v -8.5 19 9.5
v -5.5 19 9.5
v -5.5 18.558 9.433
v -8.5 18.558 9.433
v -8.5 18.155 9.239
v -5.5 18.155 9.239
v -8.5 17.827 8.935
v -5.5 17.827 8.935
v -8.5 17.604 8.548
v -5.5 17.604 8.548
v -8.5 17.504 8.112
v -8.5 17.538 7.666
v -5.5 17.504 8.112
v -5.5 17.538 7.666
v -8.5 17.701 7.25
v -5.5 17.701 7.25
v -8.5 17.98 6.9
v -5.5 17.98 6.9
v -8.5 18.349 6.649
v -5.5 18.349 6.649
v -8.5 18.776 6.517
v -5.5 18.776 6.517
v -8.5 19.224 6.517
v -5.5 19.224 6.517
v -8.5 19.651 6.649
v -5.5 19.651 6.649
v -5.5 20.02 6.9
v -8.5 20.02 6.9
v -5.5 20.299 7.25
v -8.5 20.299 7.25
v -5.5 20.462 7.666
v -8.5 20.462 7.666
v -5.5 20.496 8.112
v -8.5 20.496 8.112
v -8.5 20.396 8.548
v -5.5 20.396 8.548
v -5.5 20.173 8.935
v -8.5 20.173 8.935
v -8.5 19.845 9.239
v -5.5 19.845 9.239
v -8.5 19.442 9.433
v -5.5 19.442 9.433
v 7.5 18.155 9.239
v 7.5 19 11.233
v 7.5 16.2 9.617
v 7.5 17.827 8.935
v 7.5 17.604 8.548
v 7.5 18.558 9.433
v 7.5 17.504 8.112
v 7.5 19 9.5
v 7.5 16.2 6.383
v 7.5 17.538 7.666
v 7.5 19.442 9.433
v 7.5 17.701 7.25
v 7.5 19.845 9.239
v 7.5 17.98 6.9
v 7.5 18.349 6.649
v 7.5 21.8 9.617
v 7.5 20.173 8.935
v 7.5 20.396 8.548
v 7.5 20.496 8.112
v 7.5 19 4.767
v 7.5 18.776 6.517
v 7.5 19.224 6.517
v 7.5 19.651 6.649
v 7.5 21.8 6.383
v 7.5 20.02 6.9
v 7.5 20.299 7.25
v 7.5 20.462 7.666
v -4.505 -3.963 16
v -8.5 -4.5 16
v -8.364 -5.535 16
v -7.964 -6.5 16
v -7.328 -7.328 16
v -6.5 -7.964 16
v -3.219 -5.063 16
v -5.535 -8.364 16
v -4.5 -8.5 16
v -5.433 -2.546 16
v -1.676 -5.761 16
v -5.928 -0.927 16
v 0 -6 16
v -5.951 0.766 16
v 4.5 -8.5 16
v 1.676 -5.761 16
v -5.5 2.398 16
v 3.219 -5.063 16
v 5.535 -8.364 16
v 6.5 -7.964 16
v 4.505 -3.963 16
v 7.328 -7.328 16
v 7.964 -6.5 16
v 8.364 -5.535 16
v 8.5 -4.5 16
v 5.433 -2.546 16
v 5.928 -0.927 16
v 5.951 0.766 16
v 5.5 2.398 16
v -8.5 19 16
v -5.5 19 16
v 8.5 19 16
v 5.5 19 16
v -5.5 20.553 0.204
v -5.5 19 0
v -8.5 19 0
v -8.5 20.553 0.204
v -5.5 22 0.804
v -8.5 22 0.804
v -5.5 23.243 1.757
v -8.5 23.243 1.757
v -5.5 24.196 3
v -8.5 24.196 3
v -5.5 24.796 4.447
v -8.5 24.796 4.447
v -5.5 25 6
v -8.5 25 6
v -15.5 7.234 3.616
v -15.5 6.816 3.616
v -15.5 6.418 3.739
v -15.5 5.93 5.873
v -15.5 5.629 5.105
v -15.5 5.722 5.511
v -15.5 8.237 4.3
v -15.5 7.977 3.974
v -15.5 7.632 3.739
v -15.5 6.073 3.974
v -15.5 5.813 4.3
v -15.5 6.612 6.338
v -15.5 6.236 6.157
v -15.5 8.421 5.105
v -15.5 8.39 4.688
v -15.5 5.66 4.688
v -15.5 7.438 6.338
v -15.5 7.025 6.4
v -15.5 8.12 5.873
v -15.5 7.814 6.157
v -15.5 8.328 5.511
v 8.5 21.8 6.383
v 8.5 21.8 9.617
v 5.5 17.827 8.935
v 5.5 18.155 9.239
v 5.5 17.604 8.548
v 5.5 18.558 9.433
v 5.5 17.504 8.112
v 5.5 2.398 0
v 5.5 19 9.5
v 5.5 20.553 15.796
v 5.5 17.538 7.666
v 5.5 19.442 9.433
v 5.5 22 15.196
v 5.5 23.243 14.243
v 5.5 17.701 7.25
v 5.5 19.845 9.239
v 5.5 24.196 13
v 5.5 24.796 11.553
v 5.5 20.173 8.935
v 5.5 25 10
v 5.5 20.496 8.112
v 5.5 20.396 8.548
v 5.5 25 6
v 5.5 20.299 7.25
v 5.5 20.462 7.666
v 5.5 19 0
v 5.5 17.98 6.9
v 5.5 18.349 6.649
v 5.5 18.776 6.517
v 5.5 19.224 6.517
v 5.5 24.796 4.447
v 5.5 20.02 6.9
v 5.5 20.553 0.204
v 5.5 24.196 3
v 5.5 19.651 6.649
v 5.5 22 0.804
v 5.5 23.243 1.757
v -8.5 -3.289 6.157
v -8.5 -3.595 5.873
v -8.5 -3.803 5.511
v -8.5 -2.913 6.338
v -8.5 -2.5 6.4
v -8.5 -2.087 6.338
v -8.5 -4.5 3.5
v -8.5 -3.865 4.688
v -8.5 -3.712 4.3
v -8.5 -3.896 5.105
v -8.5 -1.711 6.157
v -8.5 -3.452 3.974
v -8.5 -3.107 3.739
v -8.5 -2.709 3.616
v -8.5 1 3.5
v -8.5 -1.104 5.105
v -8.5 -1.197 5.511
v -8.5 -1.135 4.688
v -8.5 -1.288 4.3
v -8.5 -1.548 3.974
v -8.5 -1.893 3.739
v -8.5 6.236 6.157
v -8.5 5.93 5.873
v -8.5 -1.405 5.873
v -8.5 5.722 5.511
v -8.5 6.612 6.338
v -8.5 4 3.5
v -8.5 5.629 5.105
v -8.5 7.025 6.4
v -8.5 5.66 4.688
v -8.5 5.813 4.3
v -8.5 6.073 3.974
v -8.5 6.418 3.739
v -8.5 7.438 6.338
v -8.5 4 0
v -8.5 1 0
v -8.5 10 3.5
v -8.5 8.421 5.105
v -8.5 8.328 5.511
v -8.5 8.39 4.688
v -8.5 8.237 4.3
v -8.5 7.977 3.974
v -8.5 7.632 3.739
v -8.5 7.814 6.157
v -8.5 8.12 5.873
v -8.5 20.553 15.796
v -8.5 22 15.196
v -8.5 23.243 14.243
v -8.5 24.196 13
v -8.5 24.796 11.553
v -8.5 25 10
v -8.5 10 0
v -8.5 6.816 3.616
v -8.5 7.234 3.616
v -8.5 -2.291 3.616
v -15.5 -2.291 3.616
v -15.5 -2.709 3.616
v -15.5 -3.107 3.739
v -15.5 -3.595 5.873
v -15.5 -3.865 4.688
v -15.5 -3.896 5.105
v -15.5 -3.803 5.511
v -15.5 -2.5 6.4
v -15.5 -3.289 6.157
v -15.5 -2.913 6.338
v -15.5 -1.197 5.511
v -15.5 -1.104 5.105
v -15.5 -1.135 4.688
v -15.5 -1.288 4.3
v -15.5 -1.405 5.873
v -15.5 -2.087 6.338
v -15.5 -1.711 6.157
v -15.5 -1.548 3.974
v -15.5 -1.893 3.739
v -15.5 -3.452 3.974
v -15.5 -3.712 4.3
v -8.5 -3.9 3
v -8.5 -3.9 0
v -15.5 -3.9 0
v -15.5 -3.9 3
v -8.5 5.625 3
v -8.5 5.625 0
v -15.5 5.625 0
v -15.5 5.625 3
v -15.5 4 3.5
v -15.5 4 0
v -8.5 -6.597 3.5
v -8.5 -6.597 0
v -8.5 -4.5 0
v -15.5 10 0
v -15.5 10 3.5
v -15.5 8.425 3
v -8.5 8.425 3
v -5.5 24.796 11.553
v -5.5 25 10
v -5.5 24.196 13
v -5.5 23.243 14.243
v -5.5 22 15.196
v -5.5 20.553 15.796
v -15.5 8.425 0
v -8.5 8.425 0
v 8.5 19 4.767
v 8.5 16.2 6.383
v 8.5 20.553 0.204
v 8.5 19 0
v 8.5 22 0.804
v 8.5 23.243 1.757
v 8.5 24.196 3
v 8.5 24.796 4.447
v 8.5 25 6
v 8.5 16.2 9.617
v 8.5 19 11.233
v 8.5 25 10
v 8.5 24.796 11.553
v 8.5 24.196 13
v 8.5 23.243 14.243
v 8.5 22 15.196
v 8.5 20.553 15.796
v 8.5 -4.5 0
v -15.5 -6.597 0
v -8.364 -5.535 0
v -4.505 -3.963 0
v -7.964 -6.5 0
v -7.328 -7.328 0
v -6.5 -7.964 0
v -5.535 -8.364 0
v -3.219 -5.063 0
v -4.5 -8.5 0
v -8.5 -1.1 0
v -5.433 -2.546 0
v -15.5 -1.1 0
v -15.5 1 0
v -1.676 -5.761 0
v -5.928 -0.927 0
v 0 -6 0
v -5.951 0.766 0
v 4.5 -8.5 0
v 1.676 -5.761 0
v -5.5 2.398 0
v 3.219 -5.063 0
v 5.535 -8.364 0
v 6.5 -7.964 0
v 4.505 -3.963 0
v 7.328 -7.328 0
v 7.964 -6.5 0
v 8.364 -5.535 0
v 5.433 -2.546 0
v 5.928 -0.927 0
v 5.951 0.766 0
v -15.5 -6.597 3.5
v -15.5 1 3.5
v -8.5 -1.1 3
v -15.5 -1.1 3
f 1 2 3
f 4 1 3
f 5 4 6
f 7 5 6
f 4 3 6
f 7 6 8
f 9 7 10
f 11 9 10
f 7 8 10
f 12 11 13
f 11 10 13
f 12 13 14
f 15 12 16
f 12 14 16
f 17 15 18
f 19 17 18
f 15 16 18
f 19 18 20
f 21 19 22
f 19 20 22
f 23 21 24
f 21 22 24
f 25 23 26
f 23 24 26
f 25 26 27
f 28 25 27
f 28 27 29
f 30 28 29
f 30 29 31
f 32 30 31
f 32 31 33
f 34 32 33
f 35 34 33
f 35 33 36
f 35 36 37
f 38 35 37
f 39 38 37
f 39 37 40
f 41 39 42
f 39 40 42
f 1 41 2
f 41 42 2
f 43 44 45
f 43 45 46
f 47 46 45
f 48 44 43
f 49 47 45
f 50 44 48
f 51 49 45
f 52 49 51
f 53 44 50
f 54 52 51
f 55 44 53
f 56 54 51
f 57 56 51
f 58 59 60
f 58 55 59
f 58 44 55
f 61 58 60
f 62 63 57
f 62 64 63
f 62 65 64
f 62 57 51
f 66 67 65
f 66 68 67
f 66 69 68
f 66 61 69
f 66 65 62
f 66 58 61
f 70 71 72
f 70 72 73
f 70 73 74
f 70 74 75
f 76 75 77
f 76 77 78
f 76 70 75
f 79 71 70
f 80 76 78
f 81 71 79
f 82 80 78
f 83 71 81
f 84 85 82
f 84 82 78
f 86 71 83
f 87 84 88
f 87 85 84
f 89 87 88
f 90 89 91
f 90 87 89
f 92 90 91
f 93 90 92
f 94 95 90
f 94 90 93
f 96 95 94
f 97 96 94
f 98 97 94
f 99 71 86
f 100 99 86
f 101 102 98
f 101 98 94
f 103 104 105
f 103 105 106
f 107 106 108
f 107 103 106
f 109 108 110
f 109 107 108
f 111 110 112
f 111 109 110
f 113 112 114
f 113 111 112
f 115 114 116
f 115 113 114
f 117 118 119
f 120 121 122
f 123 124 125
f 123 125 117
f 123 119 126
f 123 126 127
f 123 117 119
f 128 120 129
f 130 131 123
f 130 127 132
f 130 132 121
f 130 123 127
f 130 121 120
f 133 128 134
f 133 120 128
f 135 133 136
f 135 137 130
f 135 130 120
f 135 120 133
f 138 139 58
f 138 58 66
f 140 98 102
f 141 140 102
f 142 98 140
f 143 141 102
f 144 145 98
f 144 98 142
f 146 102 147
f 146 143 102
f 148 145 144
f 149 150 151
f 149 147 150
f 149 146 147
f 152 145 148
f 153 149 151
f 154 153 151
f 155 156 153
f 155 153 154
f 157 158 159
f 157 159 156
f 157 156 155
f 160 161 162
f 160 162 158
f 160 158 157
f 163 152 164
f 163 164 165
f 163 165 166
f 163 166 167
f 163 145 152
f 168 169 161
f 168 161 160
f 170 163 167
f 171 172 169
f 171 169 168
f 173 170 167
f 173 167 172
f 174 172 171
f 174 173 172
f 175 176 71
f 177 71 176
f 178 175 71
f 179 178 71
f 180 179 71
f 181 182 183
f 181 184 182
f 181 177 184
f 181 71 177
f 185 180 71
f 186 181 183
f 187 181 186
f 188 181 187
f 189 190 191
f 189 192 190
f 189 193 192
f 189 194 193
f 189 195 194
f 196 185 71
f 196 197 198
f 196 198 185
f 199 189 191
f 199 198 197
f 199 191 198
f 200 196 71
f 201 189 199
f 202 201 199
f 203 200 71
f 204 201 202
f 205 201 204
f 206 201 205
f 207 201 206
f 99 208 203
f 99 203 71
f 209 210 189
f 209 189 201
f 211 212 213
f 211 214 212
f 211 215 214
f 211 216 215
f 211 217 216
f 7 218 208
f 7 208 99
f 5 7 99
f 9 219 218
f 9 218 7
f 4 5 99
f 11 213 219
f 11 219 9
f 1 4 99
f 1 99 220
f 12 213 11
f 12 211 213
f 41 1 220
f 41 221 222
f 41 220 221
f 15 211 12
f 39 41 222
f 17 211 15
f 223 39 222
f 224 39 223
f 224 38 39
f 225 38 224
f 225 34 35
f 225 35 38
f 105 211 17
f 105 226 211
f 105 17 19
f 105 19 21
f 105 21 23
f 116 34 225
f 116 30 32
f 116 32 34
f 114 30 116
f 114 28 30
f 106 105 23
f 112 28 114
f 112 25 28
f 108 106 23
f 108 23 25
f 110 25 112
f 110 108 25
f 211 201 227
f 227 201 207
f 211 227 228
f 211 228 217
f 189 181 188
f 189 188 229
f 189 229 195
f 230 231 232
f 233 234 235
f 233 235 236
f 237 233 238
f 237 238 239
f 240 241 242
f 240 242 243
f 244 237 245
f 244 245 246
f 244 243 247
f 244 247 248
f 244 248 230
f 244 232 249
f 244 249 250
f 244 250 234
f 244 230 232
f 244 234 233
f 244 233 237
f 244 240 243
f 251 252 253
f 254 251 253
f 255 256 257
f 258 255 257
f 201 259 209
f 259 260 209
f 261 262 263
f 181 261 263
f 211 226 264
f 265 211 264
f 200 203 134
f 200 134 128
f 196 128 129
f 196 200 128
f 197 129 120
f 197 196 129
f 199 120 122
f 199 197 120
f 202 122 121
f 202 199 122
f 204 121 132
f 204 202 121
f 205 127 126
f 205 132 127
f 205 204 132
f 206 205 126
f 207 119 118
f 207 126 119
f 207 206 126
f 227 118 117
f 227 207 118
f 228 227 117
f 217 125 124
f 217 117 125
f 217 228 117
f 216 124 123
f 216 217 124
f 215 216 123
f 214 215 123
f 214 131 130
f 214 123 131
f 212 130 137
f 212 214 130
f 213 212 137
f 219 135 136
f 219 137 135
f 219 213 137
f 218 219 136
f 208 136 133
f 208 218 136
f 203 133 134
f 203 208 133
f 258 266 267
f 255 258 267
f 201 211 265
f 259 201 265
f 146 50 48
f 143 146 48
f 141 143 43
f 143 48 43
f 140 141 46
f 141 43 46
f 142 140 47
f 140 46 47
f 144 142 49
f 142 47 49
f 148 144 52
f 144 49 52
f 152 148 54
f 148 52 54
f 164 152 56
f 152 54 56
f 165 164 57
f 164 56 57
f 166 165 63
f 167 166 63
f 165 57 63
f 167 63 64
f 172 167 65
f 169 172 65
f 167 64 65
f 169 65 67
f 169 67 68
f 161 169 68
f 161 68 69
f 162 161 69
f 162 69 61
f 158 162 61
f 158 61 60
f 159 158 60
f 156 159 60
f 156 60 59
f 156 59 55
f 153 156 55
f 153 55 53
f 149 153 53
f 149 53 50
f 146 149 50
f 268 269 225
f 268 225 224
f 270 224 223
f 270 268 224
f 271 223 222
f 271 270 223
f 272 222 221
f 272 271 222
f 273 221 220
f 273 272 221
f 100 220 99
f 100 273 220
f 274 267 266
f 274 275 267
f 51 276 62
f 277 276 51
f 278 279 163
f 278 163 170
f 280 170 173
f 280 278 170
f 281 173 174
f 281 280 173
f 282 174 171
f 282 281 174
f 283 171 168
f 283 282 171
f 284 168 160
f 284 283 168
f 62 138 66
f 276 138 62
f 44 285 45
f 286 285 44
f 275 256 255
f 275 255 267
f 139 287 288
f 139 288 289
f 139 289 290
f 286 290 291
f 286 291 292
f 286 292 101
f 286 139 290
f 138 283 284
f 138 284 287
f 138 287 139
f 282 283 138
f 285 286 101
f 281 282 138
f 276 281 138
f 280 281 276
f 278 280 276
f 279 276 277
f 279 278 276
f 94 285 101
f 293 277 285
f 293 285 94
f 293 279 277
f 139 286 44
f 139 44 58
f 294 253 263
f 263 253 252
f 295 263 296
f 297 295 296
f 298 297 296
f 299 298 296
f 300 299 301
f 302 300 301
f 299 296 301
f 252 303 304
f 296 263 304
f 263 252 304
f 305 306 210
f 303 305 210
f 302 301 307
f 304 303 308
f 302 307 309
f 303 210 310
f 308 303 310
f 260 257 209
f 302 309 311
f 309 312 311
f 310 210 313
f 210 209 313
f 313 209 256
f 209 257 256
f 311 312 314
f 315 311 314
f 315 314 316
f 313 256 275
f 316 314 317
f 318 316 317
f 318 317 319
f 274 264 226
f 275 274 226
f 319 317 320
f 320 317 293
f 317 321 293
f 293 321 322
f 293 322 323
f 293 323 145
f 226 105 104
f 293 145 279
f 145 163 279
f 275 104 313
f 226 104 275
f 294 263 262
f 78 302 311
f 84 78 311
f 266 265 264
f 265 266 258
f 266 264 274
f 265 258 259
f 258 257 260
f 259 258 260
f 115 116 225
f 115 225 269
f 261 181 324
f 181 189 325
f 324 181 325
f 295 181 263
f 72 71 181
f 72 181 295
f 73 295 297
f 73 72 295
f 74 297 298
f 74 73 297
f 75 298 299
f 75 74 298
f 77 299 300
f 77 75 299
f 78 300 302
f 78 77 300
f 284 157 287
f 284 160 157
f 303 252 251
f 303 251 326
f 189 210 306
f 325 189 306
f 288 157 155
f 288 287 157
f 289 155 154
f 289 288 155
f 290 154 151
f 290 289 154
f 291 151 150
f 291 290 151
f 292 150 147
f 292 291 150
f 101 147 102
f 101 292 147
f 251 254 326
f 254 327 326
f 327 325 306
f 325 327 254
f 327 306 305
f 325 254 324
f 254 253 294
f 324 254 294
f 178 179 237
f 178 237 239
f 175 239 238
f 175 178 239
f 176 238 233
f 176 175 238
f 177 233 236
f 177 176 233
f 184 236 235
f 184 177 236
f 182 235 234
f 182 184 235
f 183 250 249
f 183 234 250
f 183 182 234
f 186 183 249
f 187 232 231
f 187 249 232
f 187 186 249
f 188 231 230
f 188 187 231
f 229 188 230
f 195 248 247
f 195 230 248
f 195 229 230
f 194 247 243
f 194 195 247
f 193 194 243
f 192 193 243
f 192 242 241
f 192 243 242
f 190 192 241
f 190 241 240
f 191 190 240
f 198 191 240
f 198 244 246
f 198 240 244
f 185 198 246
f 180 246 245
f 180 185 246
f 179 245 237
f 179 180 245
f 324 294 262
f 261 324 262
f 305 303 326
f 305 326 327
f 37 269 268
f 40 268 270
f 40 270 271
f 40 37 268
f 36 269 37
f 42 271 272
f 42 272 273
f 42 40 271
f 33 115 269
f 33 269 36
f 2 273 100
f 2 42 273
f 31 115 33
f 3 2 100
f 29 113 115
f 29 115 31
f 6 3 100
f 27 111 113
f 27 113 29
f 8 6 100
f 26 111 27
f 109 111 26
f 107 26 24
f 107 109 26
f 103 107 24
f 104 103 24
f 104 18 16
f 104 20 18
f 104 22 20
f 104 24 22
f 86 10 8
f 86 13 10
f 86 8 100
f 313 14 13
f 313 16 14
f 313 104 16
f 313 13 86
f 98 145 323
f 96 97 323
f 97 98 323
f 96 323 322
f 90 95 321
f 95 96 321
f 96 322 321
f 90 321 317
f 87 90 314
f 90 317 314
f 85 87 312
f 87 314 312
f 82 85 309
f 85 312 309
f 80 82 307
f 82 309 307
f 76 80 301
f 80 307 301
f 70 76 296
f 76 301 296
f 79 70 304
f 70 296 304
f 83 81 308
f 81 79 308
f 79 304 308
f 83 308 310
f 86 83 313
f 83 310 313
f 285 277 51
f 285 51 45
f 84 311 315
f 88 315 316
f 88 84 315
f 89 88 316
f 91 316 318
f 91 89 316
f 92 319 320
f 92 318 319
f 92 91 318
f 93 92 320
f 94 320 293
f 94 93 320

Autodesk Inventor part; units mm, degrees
ref_plane "YZ Plane" through (0, 0, 0) normal (1, 0, 0) x (0, 1, 0)
ref_plane "XZ Plane" through (0, 0, 0) normal (0, 1, 0) x (-1, 0, 0)
ref_plane "XY Plane" through (0, 0, 0) normal (0, 0, 1) x (1, 0, 0)
sketch "Sketch1" plane through (0, 0, 0) normal (0, 0, 1) x (1, 0, 0)
  arc A0 (-5.5, 2.3979) -> (5.5, 2.3979) centre (0, 0) ccw
  line L0 (-8.5, 0) -> (-8.5, 25)
  line L1 (-8.5, 25) -> (-5.5, 25)
  line L2 (-5.5, 25) -> (-5.5, 2.3979)
  line L3 (5.5, 2.3979) -> (5.5, 25)
  line L4 (5.5, 25) -> (8.5, 25)
  line L5 (8.5, 25) -> (8.5, 0)
  arc A1 (-8.5, 0) -> (8.5, 0) centre (0, 0) ccw
  dimension "d0" = 12
  dimension "d2" = 25
  dimension "d4" = 3
  dimension "d5" = 3
  dimension "d6" = 8.5
extrude "Extrusion1" add sketch "Sketch1" along normal blind 16
fillet "Fillet1" radius 6 4 edges at (-7, 25, 16) (-7, 25, 0) (7, 25, 0) (7, 25, 16)
sketch "Sketch2" plane through (-8.5, 0, 0) normal (-1, 0, 0) x (0, 0, 1)
  circle A0 centre (5, -2.5) radius 1.4
  circle A1 centre (5, 7.025) radius 1.4
  line L0 (0, 0) -> (0, 19) projected
  line L1 (0, -8.5) -> (16, -8.5) projected
  dimension "d10" = 2.8
  dimension "d11" = 2.8
  dimension "d12" = 9.525
  dimension "d13" = 5
  dimension "d14" = 6
extrude "Extrusion2" add sketch "Sketch2" along normal blind 7
sketch "Sketch3" plane through (0, 0, 0) normal (0, 0, -1) x (-1, 0, 0)
  line L0 (-8.5, 19) -> (-5.5, 19) projected
  line L1 (-8.5, 19) -> (-8.5, 0) projected
  arc A0 (-8.5, 0) -> (8.5, 0) centre (0, 0) ccw projected
  line L2 (8.5, 0) -> (8.5, 19) projected
  line L3 (5.5, 19) -> (8.5, 19) projected
  line L4 (5.5, 19) -> (5.5, 2.3979) projected
  arc A1 (-5.5, 2.3979) -> (5.5, 2.3979) centre (0, 0) ccw projected
  line L5 (-5.5, 2.3979) -> (-5.5, 19) projected
  line L6 (8.5, 0) -> (8.5, -8.5)
  arc A2 (-8.5, 0) -> (8.5, 0) centre (0, 0) ccw projected
  line L7 (8.5, -1.1) -> (8.5, -3.9) projected
  line L8 (8.5, -8.5) -> (-8.5, -8.5)
  line L9 (-8.5, 0) -> (-8.5, -8.5)
  line L10 (8.5, 0) -> (6, 0)
  line L11 (-8.5, 19) -> (-8.5, 0) projected
  line L12 (-6, 0) -> (-8.5, 0)
extrude "Extrusion3" add sketch "Sketch3" against normal up to surface (16 mm away) contours A0 L8 L9 | A0 L6 L8
fillet "Fillet2" radius 4 2 edges at (-8.5, -8.5, 8) (8.5, -8.5, 8)
hole "Hole1" at (-8.5, 19, 8) direction (1, 0, 0) diameter 3 end through all
sketch "Sketch5" plane through (8.5, 25, 10) normal (1, 0, 0) x (0, 0, -1)
  circle A0 centre (2, -6) radius 1.5 projected
  line L0 (10, -29.5) -> (-6, -29.5) projected
  line L1 (10, -6) -> (10, -29.5) projected
  arc A1 (10, -6) -> (4, 0) centre (4, -6) ccw projected
  line L2 (4, 0) -> (0, 0) projected
  arc A2 (0, 0) -> (-6, -6) centre (0, -6) ccw projected
  line L3 (-6, -6) -> (-6, -29.5) projected
  line L4 (5.2332, -6) -> (3.6166, -8.8)
  line L5 (3.6166, -8.8) -> (0.3834, -8.8)
  line L6 (0.3834, -8.8) -> (-1.2332, -6)
  line L7 (-1.2332, -6) -> (0.3834, -3.2)
  line L8 (0.3834, -3.2) -> (3.6166, -3.2)
  line L9 (3.6166, -3.2) -> (5.2332, -6)
  point P0 (10, -25)
  dimension "d29" = 5.6
extrude "Extrusion4" cut sketch "Sketch5" against normal blind 1 contours L4 L5 L6 L7 L8 L9
sketch "Sketch6" plane through (0, 0, 0) normal (0, 0, -1) x (-1, 0, 0)
  arc A0 (-8.5, -4.5) -> (-4.5, -8.5) centre (-4.5, -4.5) ccw projected
  line L0 (-4.5, -8.5) -> (4.5, -8.5) projected
  arc A1 (4.5, -8.5) -> (8.5, -4.5) centre (4.5, -4.5) ccw projected
  line L1 (8.5, -4.5) -> (8.5, 19) projected
  line L2 (5.5, 19) -> (8.5, 19) projected
  line L3 (5.5, 19) -> (5.5, 2.3979) projected
  arc A2 (-5.5, 2.3979) -> (5.5, 2.3979) centre (0, 0) ccw projected
  line L4 (-5.5, 2.3979) -> (-5.5, 19) projected
  line L5 (-8.5, 19) -> (-5.5, 19) projected
  line L6 (-8.5, 19) -> (-8.5, -4.5) projected
  line L7 (15.5, 5.625) -> (15.5, 8.425) projected
  line L8 (8.5, 8.425) -> (8.5, 5.625) projected
  line L9 (15.5, -3.9) -> (15.5, -1.1) projected
  line L10 (8.5, -1.1) -> (8.5, -3.9) projected
  line L11 (8.5, 8.425) -> (15.5, 8.425)
  line L12 (8.5, 5.625) -> (15.5, 5.625)
  line L13 (8.5, -1.1) -> (15.5, -1.1) projected
  line L14 (8.5, -3.9) -> (15.5, -3.9) projected
  line L15 (8.5, 10) -> (15.5, 10)
  line L16 (15.5, 10) -> (15.5, 4)
  line L17 (15.5, 4) -> (8.5, 4)
  line L18 (8.5, 4) -> (8.5, 10)
  line L19 (8.5, 19) -> (8.5, -4.5) projected
  line L20 (8.5, 1) -> (15.5, 1)
  line L21 (15.5, 1) -> (15.5, -6.597)
  line L22 (15.5, -6.597) -> (8.5, -6.597)
  line L23 (8.5, -6.597) -> (8.5, 1)
extrude "Extrusion6" add sketch "Sketch6" against normal blind 3.5 contours L1 L14 L21 L22 L23 | L1 L20 L21 L13 | L1 L12 L16 L17 | L15 L16 L11 L1
sketch "Sketch7" plane through (0, 0, 3.5) normal (0, 0, 1) x (1, 0, 0)
  line L0 (-8.5, 5.625) -> (-15.5, 5.625)
  line L1 (-15.5, 5.625) -> (-15.5, 4)
  line L2 (-15.5, 4) -> (-8.5, 4)
  line L3 (-8.5, 5.625) -> (-8.5, 4)
  line L4 (-15.5, 8.425) -> (-8.5, 8.425)
  line L5 (-8.5, 10) -> (-8.5, 5.625)
  line L6 (-8.5, 10) -> (-15.5, 10)
  line L7 (-15.5, 10) -> (-15.5, 5.625)
  line L8 (-15.5, -1.1) -> (-8.5, -1.1)
  line L9 (-8.5, 1) -> (-8.5, -3.9)
  line L10 (-8.5, 1) -> (-15.5, 1) projected
  line L11 (-15.5, 1) -> (-15.5, -3.9)
  line L12 (-8.5, -3.9) -> (-15.5, -3.9)
  line L13 (-15.5, -3.9) -> (-15.5, -6.597)
  line L14 (-15.5, -6.597) -> (-8.5, -6.597) projected
  line L15 (-8.5, -6.597) -> (-8.5, -4.5)
  line L16 (-8.5, -3.9) -> (-8.5, -4.5) projected
  line L17 (-8.5, 8.425) -> (-7, 6)
  line L18 (-8.5, 5.625) -> (-15.5, 5.625) projected
  point P0 (0, 0)
extrude "Extrusion7" add sketch "Sketch7" against normal blind 0.5 contours L0 L7 L4 L5 | L8 L9 L12 L11
properties part number "microswitch 12mm axe support"
